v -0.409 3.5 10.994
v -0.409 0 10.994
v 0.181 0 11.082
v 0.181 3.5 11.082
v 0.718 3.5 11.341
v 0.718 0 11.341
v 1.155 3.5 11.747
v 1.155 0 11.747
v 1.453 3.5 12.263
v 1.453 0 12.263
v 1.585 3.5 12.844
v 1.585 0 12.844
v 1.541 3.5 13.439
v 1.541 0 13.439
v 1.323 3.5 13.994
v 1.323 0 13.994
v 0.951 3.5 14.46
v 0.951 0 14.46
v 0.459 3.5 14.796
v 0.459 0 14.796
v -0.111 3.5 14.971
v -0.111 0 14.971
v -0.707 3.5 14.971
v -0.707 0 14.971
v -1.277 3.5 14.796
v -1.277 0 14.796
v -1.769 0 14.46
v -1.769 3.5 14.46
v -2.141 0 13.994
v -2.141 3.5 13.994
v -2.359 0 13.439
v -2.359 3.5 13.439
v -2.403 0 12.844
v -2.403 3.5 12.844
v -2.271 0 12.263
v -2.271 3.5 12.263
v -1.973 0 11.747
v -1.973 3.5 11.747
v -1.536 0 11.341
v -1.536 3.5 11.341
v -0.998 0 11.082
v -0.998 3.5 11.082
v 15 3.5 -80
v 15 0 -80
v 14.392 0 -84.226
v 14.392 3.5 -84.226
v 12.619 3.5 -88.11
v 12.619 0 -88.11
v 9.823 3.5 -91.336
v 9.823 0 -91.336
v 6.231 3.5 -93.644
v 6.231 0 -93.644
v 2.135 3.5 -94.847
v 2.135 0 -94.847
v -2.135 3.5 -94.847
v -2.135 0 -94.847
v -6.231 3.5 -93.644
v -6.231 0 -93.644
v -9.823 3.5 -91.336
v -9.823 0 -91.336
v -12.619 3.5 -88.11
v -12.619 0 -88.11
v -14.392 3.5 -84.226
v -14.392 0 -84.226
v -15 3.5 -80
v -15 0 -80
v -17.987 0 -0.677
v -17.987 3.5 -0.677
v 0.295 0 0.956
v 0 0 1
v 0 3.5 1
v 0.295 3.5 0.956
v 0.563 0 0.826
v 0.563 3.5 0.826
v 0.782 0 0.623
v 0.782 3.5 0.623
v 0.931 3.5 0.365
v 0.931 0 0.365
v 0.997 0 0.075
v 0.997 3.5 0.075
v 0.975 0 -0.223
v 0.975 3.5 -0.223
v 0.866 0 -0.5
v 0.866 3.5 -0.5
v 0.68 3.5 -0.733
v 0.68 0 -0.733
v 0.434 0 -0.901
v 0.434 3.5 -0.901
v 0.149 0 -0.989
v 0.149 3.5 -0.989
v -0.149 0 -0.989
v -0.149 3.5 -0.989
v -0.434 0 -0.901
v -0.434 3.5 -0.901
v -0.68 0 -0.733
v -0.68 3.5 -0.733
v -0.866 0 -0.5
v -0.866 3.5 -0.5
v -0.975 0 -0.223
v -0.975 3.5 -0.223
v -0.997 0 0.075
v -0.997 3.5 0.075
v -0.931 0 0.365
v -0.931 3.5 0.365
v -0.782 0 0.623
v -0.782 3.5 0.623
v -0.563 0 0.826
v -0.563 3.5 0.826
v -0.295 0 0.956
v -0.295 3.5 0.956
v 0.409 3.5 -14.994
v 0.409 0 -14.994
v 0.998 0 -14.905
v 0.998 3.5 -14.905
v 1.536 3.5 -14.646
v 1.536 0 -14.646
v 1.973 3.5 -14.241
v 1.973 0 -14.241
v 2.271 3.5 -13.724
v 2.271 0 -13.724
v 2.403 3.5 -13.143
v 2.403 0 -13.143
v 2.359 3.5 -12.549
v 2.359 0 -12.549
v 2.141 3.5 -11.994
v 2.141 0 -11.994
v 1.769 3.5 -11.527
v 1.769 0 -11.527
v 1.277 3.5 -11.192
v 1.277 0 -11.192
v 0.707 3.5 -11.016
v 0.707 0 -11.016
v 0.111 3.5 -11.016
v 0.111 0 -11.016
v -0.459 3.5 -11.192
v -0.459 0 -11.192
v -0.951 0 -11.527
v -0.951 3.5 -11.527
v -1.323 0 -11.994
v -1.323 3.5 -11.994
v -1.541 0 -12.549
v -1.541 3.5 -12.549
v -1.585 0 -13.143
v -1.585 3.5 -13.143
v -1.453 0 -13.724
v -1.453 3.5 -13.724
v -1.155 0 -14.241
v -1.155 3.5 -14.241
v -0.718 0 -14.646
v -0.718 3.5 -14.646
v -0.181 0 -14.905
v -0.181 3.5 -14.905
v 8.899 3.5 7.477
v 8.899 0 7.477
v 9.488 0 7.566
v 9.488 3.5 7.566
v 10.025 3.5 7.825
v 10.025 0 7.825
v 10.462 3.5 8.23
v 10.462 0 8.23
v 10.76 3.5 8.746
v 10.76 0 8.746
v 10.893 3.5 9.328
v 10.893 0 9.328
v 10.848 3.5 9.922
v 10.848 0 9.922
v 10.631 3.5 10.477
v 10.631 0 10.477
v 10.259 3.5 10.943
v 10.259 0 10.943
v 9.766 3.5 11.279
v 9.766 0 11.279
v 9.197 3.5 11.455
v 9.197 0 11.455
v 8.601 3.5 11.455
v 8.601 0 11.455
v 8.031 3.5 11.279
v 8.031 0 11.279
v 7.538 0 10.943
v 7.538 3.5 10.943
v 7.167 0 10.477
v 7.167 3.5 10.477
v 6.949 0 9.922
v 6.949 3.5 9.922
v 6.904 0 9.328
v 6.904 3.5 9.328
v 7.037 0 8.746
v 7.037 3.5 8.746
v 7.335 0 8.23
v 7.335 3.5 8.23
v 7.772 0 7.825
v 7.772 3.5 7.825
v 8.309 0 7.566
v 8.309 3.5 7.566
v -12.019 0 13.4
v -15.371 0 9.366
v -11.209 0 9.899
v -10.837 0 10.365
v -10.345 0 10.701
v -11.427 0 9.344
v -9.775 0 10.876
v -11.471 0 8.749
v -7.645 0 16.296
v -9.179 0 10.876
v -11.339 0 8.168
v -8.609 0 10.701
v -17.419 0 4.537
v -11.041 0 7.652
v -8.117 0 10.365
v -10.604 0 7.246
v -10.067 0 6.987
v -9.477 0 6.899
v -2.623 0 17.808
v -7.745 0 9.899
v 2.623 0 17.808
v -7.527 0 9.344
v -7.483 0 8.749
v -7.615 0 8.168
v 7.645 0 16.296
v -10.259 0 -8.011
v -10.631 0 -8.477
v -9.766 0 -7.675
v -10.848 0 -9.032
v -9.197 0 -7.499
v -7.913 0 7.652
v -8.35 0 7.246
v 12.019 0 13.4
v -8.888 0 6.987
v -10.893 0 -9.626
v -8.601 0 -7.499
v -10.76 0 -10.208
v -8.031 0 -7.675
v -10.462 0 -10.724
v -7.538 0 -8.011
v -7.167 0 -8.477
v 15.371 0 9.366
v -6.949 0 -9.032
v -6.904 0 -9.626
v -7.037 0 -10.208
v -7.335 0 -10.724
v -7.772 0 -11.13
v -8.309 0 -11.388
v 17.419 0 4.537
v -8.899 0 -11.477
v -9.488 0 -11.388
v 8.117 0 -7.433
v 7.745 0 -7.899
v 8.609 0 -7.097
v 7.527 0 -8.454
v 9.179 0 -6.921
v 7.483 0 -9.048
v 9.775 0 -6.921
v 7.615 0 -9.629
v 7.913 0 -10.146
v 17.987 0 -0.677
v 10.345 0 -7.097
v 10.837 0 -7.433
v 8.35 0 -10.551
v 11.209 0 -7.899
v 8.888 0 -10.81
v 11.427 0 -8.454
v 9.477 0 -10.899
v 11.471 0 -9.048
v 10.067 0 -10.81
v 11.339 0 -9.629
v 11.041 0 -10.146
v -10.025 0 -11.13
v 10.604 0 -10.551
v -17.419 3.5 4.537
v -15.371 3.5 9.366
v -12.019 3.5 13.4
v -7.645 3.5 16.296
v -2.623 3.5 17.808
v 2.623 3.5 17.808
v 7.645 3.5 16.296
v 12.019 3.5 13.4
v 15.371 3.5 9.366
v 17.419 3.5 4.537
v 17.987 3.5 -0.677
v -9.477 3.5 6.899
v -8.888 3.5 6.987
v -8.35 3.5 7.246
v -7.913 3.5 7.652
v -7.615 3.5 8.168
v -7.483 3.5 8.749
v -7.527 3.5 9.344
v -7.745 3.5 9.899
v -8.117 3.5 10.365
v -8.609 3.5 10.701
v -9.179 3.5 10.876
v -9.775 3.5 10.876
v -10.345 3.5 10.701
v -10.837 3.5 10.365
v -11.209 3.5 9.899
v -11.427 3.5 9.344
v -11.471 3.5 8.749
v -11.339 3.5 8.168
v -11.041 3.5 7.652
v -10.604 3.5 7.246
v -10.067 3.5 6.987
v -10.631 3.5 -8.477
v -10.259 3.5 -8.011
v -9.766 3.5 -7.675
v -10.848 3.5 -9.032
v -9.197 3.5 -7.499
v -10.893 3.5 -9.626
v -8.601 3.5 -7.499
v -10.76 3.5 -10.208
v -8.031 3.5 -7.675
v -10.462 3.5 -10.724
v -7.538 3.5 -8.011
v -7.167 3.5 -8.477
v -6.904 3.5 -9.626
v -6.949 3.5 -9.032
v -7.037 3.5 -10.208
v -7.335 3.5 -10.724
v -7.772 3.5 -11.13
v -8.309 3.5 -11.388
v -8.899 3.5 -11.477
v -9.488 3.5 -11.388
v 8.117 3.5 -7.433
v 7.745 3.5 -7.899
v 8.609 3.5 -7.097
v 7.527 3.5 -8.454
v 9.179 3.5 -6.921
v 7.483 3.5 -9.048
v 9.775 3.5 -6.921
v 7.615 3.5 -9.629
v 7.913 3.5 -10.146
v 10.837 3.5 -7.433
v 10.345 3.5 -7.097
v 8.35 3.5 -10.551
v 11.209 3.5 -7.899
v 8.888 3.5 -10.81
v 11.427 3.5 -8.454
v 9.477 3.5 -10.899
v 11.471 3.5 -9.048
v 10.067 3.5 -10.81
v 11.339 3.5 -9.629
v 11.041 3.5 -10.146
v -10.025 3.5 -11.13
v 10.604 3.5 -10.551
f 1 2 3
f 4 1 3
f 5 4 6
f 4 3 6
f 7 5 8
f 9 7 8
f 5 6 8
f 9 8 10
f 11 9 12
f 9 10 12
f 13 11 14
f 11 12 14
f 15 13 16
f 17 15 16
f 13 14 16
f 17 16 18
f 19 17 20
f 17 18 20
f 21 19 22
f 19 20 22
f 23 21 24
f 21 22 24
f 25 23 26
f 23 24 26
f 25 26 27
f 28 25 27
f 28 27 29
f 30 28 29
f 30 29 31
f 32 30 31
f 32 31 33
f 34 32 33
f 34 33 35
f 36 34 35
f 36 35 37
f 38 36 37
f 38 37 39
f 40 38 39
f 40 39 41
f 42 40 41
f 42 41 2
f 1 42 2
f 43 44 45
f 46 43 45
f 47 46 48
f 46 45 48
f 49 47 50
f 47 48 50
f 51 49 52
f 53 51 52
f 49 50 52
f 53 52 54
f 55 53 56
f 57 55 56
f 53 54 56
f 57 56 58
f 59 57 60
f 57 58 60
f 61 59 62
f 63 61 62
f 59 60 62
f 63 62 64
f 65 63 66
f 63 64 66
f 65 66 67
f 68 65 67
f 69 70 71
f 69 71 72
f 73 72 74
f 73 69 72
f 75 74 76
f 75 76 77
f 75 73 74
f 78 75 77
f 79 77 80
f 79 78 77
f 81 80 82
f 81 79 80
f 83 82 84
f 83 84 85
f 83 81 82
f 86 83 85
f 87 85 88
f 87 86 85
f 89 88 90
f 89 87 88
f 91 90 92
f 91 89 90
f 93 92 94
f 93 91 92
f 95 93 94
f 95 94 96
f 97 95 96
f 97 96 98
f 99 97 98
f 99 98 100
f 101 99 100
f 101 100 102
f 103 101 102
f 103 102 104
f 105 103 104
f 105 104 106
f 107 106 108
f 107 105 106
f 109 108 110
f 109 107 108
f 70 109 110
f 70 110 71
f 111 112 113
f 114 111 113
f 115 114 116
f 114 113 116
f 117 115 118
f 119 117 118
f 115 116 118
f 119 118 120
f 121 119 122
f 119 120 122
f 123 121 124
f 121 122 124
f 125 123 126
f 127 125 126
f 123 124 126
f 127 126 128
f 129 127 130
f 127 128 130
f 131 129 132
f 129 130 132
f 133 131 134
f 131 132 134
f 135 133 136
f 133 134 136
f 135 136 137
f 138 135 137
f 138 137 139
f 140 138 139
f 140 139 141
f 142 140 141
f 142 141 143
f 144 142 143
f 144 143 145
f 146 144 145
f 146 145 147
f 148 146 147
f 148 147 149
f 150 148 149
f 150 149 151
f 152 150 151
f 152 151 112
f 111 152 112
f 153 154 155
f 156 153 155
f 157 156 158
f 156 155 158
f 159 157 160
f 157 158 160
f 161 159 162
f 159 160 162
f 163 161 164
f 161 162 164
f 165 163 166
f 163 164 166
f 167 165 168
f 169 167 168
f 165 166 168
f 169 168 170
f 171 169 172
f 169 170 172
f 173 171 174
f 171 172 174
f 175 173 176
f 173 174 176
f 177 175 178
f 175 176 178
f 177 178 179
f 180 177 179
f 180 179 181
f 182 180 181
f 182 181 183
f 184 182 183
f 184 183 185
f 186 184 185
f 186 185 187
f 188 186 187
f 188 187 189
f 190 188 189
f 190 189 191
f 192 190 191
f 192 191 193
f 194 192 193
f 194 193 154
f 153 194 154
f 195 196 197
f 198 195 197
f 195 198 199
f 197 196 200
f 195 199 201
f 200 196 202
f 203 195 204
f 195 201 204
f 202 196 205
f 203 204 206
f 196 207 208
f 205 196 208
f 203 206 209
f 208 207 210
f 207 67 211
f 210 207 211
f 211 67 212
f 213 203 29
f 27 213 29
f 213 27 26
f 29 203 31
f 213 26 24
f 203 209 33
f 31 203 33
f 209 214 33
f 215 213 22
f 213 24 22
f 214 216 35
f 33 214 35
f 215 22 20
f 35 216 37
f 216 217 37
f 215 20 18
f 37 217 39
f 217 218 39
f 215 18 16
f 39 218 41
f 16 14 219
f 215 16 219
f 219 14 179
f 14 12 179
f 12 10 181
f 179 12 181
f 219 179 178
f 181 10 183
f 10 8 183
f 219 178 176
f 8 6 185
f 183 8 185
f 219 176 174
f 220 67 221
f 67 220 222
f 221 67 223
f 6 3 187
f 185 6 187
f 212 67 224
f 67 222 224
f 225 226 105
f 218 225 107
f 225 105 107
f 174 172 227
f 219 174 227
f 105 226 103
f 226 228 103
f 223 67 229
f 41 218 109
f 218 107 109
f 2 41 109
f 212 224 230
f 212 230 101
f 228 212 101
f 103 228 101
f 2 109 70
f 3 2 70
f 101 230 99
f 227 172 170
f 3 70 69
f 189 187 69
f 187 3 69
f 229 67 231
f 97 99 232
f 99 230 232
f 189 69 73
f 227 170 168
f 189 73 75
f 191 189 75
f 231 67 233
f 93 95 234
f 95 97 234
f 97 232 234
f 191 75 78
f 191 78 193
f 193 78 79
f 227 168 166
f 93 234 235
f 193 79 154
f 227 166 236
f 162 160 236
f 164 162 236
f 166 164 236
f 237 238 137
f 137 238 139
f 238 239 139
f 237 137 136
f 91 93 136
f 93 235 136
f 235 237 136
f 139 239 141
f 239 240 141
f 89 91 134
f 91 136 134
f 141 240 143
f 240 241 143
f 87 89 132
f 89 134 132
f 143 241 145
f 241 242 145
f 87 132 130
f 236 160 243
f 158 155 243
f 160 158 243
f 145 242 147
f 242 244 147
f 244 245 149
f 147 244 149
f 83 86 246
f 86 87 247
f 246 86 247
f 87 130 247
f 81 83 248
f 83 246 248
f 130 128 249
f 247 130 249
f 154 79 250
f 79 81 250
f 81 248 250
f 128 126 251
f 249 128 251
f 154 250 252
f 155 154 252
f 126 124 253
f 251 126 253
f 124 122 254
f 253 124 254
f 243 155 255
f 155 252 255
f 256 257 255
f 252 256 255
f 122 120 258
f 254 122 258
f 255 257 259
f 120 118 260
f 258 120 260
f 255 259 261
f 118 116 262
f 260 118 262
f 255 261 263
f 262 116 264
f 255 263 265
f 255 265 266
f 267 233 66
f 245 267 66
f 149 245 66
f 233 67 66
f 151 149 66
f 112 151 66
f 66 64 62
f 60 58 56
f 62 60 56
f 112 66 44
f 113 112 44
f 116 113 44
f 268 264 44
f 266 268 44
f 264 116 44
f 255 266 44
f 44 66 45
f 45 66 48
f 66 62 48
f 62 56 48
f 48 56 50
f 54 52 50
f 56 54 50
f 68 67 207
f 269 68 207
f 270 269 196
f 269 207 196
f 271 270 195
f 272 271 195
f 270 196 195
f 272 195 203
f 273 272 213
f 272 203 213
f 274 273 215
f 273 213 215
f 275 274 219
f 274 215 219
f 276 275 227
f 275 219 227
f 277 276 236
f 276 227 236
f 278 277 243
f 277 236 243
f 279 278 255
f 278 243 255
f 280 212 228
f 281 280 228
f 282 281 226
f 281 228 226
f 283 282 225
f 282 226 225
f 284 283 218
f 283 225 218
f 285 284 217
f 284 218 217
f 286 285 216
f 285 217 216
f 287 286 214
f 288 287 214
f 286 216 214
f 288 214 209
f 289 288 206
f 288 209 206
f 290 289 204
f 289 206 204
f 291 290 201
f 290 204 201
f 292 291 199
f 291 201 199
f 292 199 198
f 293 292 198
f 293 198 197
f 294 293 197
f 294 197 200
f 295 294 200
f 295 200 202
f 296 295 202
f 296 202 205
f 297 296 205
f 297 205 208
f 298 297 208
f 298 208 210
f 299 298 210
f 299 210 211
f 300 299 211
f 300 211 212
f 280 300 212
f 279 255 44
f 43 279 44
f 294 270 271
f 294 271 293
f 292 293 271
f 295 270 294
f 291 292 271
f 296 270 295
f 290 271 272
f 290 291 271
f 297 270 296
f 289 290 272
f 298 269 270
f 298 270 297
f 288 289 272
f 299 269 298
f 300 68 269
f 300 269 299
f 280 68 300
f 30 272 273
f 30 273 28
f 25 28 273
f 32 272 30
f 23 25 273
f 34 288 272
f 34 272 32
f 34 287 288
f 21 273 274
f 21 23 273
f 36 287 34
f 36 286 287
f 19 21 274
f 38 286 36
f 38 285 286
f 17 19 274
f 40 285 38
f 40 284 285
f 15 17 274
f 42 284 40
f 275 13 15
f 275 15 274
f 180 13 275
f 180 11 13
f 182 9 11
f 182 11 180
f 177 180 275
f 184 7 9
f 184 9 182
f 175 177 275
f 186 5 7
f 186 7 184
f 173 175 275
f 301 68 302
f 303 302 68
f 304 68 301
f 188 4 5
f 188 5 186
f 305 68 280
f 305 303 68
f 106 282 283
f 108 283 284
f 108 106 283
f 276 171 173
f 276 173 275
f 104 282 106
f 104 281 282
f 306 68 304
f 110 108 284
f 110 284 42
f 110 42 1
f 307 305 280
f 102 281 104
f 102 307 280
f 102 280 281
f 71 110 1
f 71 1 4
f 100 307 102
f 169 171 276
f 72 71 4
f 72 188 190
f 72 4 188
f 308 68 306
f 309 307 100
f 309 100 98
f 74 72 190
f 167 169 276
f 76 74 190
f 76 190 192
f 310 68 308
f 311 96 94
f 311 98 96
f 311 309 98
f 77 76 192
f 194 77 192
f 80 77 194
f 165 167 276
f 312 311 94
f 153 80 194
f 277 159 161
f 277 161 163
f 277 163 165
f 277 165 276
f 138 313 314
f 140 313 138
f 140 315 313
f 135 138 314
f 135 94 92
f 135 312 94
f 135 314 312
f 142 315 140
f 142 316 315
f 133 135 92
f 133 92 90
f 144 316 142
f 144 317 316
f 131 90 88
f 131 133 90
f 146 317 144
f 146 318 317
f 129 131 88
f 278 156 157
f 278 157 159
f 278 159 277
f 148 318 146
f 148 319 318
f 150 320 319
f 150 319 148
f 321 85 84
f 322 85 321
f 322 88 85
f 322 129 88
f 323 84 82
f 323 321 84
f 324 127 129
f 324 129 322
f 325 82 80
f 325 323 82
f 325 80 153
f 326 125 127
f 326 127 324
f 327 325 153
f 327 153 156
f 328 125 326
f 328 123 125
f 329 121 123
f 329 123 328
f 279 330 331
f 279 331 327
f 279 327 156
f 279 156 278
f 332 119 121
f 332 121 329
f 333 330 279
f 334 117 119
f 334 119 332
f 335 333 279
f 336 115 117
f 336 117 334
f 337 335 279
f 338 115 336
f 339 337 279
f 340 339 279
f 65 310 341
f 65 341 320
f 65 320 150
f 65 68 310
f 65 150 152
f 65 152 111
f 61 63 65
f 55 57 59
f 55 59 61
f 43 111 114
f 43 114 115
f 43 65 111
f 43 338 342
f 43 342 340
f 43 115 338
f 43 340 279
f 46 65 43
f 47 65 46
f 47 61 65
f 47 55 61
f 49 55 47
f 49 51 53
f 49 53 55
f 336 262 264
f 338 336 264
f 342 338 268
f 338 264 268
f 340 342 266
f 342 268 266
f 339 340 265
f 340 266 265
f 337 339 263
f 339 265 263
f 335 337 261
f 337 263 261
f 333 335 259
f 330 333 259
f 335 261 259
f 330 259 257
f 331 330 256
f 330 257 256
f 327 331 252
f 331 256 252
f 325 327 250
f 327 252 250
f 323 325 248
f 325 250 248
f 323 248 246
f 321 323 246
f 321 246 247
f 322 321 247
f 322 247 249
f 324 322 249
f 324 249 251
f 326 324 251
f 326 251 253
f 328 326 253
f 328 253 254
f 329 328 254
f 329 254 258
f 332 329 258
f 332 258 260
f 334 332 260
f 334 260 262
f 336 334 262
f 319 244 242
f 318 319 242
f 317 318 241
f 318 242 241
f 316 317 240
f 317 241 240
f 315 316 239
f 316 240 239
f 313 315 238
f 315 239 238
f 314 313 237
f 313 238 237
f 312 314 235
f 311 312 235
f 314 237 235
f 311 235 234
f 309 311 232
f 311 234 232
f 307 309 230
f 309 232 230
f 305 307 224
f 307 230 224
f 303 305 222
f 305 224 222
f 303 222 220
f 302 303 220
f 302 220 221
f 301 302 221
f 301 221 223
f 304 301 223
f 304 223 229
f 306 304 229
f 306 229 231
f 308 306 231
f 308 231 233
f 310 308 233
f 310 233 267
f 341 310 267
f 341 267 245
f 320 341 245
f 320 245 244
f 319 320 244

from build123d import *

# Parameters (mm, degrees)
SKETCH_1_R          = 1
EXTRUDE_1_DEPTH     = 3.5
SKETCH_2_R          = 2
CUT_EXTRUDE_1_DEPTH = 97.753552906


with BuildPart() as part:
    # Эскиз1 → Вытянуть1 (new body)
    with BuildSketch(Plane(origin=(0, 0, 0), x_dir=(1, 0, 0), z_dir=(0, 1, 0))):
        with BuildLine():
            Line((-15, 80), (-17.987249423, 0.677390733))
            ThreePointArc((-17.987249423, 0.677390733), (0, -18), (17.987249423, 0.677390733))
            Line((17.987249423, 0.677390733), (15, 80))
            ThreePointArc((15, 80), (0, 95), (-15, 80))
        make_face()
        with Locations(Location((0, 0, 0), (0, 0, 270))):
            Circle(SKETCH_1_R, mode=Mode.SUBTRACT)
    extrude(amount=EXTRUDE_1_DEPTH)

    # Эскиз2 → Вырез-Вытянуть1 (cut, through all)
    with BuildSketch(Plane.XZ):
        with Locations(Location((-0.408986403, 12.99356495, 0), (0, 0, 270))):
            Circle(SKETCH_2_R)
        with Locations(Location((-9.477034947, 8.898640829, 0), (0, 0, 270))):
            Circle(SKETCH_2_R)
        with Locations(Location((8.898640829, 9.477034947, 0), (0, 0, 270))):
            Circle(SKETCH_2_R)
        with Locations(Location((9.477034947, -8.898640829, 0), (0, 0, 270))):
            Circle(SKETCH_2_R)
        with Locations(Location((0.408986403, -12.99356495, 0), (0, 0, 270))):
            Circle(SKETCH_2_R)
        with Locations(Location((-8.898640829, -9.477034947, 0), (0, 0, 270))):
            Circle(SKETCH_2_R)
    extrude(amount=-CUT_EXTRUDE_1_DEPTH, mode=Mode.SUBTRACT)


solid = part.part
